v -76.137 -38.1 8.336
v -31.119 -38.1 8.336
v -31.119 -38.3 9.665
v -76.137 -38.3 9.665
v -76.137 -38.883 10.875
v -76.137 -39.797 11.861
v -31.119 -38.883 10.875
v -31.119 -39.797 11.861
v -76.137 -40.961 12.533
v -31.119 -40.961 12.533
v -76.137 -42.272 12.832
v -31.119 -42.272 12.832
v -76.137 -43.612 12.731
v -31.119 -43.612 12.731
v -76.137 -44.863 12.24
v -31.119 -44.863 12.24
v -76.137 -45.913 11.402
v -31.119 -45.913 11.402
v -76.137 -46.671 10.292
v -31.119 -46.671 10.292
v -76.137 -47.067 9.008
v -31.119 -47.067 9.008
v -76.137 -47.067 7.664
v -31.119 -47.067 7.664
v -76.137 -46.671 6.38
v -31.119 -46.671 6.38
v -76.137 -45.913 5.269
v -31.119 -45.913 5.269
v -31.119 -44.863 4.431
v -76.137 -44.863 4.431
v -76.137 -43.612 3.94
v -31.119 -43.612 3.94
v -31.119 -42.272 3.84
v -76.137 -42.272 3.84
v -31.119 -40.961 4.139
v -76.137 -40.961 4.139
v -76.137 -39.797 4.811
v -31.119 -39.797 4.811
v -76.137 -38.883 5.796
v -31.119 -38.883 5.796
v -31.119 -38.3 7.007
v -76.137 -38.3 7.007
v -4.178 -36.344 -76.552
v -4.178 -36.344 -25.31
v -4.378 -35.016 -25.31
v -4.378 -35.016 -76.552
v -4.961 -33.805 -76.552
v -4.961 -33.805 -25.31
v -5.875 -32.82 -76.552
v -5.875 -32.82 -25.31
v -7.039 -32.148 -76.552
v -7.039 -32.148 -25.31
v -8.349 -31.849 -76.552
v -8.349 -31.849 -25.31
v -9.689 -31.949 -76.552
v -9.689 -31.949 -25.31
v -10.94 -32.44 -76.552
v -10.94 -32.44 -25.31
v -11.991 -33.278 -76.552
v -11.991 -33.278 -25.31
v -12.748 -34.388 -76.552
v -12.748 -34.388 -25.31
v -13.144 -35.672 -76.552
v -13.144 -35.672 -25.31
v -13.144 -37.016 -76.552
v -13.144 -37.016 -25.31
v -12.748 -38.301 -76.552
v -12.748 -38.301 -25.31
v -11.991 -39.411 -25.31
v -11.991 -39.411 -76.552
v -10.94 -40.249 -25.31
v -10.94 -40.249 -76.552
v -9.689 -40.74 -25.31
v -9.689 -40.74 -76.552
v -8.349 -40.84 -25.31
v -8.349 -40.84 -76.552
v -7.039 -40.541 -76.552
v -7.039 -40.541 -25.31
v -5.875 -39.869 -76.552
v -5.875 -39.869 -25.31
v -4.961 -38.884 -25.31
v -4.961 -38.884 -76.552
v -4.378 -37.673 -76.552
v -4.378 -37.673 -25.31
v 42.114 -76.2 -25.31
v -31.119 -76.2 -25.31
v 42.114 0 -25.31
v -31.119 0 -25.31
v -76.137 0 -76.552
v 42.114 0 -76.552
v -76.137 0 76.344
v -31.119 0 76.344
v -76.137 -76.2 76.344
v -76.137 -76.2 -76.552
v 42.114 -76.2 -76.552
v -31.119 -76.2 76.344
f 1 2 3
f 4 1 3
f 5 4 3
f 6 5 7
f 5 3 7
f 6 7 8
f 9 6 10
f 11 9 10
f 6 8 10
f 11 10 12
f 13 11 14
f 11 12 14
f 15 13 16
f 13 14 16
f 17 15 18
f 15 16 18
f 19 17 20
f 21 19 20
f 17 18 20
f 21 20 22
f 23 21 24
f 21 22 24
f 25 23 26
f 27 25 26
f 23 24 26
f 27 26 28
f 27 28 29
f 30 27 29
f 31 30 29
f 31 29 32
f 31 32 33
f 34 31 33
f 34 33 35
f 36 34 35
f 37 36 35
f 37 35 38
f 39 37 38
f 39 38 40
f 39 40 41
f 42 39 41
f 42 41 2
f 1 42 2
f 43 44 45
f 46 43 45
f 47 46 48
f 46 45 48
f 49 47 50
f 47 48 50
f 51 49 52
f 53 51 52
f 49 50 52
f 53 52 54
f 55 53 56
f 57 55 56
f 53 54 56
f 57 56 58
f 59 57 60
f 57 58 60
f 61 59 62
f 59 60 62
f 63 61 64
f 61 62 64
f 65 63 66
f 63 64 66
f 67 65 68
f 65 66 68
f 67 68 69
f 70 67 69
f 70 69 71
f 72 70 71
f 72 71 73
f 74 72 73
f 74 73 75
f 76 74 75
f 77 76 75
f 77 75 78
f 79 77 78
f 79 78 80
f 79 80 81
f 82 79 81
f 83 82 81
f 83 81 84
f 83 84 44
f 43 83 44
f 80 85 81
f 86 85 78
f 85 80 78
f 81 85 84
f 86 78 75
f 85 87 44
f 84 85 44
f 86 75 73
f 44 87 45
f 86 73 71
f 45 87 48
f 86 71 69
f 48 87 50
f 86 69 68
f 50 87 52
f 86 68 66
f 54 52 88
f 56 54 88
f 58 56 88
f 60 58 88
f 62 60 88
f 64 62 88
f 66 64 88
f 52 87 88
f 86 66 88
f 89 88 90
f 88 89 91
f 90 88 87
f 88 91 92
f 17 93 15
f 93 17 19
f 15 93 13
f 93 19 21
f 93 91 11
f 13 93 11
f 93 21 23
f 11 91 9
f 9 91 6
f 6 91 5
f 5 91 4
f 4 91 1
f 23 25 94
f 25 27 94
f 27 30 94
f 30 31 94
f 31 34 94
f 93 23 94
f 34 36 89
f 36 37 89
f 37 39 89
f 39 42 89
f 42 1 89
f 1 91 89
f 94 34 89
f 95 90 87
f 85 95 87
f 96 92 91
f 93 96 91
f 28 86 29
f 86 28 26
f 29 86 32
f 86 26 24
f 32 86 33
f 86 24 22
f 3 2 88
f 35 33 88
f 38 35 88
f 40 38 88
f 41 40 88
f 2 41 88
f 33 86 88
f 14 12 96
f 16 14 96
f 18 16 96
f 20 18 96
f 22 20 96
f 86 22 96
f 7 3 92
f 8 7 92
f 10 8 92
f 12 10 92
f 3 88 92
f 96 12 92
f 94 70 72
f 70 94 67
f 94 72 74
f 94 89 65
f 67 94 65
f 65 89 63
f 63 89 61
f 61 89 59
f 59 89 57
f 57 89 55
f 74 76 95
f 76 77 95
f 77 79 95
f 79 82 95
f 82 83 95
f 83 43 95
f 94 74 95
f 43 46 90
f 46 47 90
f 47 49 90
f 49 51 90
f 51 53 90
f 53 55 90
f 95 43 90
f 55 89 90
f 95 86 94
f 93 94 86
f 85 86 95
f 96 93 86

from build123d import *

# Parameters (mm, degrees)
F1_DEPTH = 76.2
F2_R     = 4.5085
F4_DEPTH = 76.2
F3_R     = 4.5085
F5_DEPTH = 76.2


with BuildPart() as f1:
    # F0 (on Front) → F1 (new body)
    with BuildSketch(Plane.XZ):
        Polygon((-31.118602, 76.344244), (-76.136798, 76.344244), (-76.136798, -25.309771), (-76.136798, -76.344237), (-76.136798, -76.551691), (42.113781, -76.551691), (42.113781, -25.309771), (-31.118602, -25.309771), align=None)
    extrude(amount=F1_DEPTH)

    # F2 (on face) → F4 (cut)
    with BuildSketch(Plane.XY.offset(-25.309771)):
        with Locations((-8.686219, -36.344424)):
            Circle(F2_R)
    extrude(amount=-F4_DEPTH, mode=Mode.SUBTRACT)

    # F3 (on face) → F5 (cut)
    with BuildSketch(Plane.YZ.offset(-31.118602)):
        with Locations((-42.6085, 8.335744)):
            Circle(F3_R)
    extrude(amount=-F5_DEPTH, mode=Mode.SUBTRACT)


solid = f1.part
